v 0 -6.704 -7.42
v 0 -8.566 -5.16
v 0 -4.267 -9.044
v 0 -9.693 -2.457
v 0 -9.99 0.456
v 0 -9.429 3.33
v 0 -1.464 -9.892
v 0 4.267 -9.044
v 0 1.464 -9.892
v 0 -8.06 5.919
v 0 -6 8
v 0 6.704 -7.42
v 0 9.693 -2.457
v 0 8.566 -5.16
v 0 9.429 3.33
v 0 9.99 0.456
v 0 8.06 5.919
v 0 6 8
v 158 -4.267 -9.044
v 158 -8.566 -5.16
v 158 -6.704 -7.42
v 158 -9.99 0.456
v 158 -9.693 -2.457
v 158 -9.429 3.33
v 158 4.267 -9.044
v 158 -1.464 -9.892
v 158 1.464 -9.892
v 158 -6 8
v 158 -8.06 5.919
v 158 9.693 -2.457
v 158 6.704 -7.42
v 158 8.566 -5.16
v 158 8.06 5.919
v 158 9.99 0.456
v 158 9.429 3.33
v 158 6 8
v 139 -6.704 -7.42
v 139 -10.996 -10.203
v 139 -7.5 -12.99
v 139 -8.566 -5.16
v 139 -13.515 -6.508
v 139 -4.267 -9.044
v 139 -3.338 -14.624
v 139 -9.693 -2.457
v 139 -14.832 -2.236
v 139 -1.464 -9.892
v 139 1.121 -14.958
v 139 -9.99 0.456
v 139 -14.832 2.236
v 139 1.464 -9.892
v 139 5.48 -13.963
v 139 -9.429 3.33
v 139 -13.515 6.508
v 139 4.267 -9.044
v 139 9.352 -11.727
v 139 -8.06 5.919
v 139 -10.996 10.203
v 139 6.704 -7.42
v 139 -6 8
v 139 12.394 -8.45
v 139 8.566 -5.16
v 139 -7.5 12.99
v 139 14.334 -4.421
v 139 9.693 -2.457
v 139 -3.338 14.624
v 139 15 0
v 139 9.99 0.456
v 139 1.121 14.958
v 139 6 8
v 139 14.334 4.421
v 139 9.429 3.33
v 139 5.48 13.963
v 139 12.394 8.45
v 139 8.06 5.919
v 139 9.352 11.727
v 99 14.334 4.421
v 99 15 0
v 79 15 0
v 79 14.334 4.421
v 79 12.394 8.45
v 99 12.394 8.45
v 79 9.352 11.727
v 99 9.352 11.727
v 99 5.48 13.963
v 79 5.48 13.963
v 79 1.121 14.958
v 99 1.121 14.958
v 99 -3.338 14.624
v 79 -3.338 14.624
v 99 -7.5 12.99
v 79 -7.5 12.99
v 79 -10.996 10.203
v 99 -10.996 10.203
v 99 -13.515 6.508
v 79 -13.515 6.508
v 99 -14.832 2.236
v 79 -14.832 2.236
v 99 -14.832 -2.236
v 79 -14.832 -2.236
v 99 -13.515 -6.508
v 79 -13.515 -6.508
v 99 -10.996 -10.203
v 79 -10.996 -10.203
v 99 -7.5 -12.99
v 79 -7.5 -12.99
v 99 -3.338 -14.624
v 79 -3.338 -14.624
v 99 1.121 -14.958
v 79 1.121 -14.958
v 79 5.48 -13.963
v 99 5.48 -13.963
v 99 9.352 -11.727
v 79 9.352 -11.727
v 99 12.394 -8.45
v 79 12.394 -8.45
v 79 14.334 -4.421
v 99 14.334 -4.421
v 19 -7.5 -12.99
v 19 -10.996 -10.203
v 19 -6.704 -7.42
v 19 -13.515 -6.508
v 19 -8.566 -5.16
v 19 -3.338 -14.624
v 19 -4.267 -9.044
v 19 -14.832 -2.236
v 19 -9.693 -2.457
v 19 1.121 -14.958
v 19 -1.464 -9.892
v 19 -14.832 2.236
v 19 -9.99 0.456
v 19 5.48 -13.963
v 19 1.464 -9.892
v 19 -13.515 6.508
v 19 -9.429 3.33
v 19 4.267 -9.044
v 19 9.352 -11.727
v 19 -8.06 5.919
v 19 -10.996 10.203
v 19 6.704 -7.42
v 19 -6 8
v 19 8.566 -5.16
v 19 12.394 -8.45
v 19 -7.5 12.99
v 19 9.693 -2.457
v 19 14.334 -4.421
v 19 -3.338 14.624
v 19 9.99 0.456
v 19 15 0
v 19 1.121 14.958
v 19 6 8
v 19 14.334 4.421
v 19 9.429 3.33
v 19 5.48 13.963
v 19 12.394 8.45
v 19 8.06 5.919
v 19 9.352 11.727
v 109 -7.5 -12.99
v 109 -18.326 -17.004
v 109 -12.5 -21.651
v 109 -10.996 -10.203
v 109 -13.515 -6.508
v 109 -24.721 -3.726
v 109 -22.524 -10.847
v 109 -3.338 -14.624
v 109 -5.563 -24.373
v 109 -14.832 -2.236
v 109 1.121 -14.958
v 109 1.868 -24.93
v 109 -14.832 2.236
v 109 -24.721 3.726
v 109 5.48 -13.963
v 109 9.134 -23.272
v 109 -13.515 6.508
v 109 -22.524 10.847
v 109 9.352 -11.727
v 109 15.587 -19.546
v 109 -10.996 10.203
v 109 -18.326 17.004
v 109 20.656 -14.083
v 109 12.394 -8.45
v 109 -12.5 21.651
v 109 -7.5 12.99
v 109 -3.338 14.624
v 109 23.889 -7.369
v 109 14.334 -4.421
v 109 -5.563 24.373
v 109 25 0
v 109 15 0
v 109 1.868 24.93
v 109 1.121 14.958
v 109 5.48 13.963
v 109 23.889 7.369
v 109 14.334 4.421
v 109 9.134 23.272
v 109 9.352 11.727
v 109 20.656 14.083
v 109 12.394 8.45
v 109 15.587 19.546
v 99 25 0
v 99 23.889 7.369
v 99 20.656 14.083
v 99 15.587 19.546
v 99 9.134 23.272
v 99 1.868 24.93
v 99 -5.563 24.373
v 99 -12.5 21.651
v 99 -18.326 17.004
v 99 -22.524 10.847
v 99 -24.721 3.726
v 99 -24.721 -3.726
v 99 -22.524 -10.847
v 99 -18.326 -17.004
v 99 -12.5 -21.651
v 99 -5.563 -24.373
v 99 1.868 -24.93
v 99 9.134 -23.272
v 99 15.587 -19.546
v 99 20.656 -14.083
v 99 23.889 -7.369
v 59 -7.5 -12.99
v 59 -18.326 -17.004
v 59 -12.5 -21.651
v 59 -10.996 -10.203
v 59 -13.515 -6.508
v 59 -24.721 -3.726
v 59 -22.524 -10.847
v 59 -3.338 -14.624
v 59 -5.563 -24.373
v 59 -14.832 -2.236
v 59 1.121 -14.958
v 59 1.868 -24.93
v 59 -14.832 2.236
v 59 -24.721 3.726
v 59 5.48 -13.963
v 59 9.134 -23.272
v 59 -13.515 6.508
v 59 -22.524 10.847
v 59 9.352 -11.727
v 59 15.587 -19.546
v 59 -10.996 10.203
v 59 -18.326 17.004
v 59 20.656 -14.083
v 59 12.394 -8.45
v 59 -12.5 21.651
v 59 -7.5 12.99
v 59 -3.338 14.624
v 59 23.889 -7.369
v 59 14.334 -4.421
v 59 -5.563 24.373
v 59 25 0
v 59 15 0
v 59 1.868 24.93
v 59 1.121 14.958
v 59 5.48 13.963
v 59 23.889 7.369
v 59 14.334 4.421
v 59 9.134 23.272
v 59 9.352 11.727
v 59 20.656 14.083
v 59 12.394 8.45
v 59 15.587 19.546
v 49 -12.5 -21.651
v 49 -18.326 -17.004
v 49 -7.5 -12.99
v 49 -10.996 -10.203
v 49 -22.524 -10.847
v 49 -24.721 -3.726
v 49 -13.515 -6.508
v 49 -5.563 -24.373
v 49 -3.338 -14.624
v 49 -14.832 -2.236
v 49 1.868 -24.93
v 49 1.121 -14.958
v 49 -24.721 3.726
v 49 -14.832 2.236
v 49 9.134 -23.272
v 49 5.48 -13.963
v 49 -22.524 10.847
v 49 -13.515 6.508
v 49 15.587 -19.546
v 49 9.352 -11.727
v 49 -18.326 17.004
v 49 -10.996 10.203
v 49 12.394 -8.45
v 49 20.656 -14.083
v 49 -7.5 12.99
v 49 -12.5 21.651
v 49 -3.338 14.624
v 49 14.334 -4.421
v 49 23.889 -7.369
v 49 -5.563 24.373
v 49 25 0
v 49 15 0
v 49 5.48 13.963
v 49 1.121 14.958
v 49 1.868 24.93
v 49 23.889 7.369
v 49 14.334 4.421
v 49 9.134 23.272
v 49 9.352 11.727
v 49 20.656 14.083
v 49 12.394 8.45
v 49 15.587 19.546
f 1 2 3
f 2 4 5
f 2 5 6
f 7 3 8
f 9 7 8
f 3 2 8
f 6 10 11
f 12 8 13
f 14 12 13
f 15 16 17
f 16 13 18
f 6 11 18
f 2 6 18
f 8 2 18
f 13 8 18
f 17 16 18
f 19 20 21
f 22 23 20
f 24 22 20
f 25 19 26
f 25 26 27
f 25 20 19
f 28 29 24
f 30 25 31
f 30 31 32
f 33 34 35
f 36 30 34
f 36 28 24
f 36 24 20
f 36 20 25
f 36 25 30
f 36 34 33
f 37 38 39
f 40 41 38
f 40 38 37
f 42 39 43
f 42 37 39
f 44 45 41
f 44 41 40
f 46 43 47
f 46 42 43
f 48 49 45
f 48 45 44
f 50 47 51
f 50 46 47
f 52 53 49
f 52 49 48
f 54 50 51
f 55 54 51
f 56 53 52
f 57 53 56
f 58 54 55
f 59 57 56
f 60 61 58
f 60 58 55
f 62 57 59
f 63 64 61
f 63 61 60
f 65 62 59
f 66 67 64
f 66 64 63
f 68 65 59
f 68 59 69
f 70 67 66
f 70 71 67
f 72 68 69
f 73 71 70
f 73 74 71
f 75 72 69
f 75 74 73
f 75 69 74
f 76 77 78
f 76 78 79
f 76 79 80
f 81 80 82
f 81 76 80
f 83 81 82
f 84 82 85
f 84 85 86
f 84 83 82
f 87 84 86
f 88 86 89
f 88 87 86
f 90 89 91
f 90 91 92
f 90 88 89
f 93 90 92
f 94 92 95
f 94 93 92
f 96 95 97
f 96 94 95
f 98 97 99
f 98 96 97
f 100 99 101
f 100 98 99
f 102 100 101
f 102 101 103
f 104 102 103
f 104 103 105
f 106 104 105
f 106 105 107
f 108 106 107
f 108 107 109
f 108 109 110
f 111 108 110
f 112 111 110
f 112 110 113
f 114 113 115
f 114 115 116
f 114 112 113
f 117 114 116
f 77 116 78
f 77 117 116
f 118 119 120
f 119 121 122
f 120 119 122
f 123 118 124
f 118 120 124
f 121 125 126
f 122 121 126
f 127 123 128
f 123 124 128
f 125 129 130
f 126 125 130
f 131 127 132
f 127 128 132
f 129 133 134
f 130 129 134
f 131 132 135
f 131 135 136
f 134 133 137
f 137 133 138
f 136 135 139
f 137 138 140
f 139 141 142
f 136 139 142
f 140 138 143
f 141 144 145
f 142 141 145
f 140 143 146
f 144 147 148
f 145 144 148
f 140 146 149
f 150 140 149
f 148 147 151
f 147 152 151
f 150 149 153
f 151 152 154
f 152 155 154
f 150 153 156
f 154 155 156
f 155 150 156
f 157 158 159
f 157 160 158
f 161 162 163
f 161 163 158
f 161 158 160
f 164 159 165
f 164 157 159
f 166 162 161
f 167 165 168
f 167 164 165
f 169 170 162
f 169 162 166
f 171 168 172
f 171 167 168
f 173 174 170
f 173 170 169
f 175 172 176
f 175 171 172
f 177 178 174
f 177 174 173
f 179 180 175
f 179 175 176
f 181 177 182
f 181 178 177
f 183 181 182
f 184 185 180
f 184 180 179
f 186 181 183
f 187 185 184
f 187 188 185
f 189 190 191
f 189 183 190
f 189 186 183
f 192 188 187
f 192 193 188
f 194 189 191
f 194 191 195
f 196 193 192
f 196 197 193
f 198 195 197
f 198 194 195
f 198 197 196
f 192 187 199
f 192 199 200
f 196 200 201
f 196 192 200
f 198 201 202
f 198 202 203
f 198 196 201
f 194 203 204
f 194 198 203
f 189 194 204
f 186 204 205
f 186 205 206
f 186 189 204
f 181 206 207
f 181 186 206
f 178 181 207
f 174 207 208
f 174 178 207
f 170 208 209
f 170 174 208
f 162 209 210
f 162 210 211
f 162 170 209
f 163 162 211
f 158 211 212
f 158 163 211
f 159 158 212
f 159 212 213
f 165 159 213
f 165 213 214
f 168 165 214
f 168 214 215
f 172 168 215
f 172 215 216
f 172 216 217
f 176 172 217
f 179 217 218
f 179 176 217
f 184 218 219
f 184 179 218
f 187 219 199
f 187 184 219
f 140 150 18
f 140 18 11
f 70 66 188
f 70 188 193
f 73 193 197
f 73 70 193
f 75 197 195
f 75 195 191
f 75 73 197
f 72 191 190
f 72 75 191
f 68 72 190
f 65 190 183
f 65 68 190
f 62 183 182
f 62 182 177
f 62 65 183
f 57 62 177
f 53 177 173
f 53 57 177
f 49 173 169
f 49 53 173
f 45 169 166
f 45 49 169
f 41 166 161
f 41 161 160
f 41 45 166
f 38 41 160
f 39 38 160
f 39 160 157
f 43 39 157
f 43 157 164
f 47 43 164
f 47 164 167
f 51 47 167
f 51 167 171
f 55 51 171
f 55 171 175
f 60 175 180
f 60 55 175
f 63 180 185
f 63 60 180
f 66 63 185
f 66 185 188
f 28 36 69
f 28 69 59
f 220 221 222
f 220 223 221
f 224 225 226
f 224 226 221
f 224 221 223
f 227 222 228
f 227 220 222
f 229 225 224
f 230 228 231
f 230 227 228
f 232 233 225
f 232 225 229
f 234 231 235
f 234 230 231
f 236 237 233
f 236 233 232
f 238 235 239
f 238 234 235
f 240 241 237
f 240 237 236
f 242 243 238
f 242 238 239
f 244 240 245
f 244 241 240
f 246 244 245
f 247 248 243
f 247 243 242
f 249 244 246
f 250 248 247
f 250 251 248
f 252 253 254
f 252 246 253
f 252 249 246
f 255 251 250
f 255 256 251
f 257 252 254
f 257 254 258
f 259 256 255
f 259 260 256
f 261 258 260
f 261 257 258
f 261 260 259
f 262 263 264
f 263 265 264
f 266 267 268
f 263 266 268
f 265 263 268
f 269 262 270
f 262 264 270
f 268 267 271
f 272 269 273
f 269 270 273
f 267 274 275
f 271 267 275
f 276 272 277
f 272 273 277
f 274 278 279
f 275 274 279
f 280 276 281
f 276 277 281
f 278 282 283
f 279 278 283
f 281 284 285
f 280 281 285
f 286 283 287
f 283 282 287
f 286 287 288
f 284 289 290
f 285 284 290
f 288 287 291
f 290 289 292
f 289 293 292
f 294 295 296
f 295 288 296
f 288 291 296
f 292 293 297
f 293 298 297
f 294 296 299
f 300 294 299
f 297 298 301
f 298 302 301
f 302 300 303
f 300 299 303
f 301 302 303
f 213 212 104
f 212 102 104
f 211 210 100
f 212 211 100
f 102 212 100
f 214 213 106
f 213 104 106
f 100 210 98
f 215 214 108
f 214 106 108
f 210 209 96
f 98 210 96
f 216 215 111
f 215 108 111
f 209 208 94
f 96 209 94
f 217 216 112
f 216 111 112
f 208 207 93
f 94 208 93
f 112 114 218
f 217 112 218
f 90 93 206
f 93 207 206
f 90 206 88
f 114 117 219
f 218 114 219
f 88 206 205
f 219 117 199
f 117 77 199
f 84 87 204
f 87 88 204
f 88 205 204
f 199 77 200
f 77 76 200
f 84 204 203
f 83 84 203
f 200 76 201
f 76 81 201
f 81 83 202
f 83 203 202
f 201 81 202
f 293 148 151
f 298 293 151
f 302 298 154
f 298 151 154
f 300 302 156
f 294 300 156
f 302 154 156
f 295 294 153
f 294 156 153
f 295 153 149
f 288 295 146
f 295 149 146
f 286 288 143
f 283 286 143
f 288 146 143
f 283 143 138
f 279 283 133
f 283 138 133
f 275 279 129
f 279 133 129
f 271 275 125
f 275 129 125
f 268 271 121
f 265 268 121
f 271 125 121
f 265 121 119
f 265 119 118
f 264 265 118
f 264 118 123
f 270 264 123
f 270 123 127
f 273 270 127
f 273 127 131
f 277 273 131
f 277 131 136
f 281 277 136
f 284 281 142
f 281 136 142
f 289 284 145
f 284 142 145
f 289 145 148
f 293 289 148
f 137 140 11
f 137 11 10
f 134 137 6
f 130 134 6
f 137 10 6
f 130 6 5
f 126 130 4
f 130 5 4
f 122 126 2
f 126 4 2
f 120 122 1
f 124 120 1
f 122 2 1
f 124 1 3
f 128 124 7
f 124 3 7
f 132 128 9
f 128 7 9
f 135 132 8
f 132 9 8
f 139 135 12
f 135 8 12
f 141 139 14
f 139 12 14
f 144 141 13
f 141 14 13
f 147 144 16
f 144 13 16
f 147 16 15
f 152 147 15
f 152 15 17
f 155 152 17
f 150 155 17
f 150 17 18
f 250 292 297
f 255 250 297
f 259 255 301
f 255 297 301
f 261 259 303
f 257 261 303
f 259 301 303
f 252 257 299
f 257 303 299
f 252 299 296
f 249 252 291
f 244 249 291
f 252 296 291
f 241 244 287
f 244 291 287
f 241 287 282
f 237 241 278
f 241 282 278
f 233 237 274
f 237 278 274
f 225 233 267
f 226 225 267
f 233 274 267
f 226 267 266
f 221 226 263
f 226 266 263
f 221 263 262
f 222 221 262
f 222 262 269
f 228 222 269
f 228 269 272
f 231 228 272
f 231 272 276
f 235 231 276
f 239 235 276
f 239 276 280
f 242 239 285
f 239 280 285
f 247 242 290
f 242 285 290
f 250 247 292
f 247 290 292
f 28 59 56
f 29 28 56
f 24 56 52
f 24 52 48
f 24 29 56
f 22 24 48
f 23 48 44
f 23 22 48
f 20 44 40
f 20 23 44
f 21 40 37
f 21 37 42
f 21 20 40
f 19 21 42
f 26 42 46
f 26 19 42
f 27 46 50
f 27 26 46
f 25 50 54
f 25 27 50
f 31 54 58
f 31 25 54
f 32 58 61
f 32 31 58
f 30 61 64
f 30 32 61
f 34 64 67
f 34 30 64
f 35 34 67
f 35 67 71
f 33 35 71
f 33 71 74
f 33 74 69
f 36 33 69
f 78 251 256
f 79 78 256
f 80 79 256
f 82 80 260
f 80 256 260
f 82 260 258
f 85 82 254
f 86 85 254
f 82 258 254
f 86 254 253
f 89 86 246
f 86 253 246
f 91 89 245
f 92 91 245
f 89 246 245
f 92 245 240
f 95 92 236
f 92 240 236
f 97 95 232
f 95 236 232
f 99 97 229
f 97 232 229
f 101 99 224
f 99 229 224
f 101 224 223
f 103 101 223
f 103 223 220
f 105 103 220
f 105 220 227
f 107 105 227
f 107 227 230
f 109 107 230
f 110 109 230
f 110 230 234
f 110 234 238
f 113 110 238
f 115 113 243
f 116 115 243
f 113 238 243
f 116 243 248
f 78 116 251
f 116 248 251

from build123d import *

# Parameters (mm, degrees)
F0_R     = 10
F1_DEPTH = 19
F2_R     = 15
F3_DEPTH = 30
F4_R     = 25
F5_DEPTH = 10
F6_R     = 15
F7_DEPTH = 20
F9_DEPTH = 19


with BuildPart() as f1:
    # F0 (on Right) → F1 (new body)
    with BuildSketch(Plane.YZ):
        Circle(F0_R)
    extrude(amount=F1_DEPTH)

    # F2 (on face) → F3 (join)
    with BuildSketch(Plane.YZ.offset(19)):
        Circle(F2_R)
    extrude(amount=F3_DEPTH)

    # F4 (on face) → F5 (join)
    with BuildSketch(Plane.YZ.offset(49)):
        Circle(F4_R)
    extrude(amount=F5_DEPTH)

    # F6 (on face) → F7 (join)
    with BuildSketch(Plane.YZ.offset(59)):
        Circle(F6_R)
    extrude(amount=F7_DEPTH)

    # F8 (on face) → F9 (cut, through all)
    with BuildSketch(Plane(origin=(0, 0, 0), x_dir=(0, -1, 0), z_dir=(-1, 0, 0))):
        with BuildLine():
            ThreePointArc((6, 8), (0, 10), (-6, 8))
            Line((-6, 8), (6, 8))
        make_face()
    extrude(amount=-F9_DEPTH, mode=Mode.SUBTRACT)

    # F10: F1 across face


with BuildPart() as f1_1:
    add(f1.part)
    add(f1.part.mirror(Plane.YZ.offset(79)))


solid = f1_1.part
